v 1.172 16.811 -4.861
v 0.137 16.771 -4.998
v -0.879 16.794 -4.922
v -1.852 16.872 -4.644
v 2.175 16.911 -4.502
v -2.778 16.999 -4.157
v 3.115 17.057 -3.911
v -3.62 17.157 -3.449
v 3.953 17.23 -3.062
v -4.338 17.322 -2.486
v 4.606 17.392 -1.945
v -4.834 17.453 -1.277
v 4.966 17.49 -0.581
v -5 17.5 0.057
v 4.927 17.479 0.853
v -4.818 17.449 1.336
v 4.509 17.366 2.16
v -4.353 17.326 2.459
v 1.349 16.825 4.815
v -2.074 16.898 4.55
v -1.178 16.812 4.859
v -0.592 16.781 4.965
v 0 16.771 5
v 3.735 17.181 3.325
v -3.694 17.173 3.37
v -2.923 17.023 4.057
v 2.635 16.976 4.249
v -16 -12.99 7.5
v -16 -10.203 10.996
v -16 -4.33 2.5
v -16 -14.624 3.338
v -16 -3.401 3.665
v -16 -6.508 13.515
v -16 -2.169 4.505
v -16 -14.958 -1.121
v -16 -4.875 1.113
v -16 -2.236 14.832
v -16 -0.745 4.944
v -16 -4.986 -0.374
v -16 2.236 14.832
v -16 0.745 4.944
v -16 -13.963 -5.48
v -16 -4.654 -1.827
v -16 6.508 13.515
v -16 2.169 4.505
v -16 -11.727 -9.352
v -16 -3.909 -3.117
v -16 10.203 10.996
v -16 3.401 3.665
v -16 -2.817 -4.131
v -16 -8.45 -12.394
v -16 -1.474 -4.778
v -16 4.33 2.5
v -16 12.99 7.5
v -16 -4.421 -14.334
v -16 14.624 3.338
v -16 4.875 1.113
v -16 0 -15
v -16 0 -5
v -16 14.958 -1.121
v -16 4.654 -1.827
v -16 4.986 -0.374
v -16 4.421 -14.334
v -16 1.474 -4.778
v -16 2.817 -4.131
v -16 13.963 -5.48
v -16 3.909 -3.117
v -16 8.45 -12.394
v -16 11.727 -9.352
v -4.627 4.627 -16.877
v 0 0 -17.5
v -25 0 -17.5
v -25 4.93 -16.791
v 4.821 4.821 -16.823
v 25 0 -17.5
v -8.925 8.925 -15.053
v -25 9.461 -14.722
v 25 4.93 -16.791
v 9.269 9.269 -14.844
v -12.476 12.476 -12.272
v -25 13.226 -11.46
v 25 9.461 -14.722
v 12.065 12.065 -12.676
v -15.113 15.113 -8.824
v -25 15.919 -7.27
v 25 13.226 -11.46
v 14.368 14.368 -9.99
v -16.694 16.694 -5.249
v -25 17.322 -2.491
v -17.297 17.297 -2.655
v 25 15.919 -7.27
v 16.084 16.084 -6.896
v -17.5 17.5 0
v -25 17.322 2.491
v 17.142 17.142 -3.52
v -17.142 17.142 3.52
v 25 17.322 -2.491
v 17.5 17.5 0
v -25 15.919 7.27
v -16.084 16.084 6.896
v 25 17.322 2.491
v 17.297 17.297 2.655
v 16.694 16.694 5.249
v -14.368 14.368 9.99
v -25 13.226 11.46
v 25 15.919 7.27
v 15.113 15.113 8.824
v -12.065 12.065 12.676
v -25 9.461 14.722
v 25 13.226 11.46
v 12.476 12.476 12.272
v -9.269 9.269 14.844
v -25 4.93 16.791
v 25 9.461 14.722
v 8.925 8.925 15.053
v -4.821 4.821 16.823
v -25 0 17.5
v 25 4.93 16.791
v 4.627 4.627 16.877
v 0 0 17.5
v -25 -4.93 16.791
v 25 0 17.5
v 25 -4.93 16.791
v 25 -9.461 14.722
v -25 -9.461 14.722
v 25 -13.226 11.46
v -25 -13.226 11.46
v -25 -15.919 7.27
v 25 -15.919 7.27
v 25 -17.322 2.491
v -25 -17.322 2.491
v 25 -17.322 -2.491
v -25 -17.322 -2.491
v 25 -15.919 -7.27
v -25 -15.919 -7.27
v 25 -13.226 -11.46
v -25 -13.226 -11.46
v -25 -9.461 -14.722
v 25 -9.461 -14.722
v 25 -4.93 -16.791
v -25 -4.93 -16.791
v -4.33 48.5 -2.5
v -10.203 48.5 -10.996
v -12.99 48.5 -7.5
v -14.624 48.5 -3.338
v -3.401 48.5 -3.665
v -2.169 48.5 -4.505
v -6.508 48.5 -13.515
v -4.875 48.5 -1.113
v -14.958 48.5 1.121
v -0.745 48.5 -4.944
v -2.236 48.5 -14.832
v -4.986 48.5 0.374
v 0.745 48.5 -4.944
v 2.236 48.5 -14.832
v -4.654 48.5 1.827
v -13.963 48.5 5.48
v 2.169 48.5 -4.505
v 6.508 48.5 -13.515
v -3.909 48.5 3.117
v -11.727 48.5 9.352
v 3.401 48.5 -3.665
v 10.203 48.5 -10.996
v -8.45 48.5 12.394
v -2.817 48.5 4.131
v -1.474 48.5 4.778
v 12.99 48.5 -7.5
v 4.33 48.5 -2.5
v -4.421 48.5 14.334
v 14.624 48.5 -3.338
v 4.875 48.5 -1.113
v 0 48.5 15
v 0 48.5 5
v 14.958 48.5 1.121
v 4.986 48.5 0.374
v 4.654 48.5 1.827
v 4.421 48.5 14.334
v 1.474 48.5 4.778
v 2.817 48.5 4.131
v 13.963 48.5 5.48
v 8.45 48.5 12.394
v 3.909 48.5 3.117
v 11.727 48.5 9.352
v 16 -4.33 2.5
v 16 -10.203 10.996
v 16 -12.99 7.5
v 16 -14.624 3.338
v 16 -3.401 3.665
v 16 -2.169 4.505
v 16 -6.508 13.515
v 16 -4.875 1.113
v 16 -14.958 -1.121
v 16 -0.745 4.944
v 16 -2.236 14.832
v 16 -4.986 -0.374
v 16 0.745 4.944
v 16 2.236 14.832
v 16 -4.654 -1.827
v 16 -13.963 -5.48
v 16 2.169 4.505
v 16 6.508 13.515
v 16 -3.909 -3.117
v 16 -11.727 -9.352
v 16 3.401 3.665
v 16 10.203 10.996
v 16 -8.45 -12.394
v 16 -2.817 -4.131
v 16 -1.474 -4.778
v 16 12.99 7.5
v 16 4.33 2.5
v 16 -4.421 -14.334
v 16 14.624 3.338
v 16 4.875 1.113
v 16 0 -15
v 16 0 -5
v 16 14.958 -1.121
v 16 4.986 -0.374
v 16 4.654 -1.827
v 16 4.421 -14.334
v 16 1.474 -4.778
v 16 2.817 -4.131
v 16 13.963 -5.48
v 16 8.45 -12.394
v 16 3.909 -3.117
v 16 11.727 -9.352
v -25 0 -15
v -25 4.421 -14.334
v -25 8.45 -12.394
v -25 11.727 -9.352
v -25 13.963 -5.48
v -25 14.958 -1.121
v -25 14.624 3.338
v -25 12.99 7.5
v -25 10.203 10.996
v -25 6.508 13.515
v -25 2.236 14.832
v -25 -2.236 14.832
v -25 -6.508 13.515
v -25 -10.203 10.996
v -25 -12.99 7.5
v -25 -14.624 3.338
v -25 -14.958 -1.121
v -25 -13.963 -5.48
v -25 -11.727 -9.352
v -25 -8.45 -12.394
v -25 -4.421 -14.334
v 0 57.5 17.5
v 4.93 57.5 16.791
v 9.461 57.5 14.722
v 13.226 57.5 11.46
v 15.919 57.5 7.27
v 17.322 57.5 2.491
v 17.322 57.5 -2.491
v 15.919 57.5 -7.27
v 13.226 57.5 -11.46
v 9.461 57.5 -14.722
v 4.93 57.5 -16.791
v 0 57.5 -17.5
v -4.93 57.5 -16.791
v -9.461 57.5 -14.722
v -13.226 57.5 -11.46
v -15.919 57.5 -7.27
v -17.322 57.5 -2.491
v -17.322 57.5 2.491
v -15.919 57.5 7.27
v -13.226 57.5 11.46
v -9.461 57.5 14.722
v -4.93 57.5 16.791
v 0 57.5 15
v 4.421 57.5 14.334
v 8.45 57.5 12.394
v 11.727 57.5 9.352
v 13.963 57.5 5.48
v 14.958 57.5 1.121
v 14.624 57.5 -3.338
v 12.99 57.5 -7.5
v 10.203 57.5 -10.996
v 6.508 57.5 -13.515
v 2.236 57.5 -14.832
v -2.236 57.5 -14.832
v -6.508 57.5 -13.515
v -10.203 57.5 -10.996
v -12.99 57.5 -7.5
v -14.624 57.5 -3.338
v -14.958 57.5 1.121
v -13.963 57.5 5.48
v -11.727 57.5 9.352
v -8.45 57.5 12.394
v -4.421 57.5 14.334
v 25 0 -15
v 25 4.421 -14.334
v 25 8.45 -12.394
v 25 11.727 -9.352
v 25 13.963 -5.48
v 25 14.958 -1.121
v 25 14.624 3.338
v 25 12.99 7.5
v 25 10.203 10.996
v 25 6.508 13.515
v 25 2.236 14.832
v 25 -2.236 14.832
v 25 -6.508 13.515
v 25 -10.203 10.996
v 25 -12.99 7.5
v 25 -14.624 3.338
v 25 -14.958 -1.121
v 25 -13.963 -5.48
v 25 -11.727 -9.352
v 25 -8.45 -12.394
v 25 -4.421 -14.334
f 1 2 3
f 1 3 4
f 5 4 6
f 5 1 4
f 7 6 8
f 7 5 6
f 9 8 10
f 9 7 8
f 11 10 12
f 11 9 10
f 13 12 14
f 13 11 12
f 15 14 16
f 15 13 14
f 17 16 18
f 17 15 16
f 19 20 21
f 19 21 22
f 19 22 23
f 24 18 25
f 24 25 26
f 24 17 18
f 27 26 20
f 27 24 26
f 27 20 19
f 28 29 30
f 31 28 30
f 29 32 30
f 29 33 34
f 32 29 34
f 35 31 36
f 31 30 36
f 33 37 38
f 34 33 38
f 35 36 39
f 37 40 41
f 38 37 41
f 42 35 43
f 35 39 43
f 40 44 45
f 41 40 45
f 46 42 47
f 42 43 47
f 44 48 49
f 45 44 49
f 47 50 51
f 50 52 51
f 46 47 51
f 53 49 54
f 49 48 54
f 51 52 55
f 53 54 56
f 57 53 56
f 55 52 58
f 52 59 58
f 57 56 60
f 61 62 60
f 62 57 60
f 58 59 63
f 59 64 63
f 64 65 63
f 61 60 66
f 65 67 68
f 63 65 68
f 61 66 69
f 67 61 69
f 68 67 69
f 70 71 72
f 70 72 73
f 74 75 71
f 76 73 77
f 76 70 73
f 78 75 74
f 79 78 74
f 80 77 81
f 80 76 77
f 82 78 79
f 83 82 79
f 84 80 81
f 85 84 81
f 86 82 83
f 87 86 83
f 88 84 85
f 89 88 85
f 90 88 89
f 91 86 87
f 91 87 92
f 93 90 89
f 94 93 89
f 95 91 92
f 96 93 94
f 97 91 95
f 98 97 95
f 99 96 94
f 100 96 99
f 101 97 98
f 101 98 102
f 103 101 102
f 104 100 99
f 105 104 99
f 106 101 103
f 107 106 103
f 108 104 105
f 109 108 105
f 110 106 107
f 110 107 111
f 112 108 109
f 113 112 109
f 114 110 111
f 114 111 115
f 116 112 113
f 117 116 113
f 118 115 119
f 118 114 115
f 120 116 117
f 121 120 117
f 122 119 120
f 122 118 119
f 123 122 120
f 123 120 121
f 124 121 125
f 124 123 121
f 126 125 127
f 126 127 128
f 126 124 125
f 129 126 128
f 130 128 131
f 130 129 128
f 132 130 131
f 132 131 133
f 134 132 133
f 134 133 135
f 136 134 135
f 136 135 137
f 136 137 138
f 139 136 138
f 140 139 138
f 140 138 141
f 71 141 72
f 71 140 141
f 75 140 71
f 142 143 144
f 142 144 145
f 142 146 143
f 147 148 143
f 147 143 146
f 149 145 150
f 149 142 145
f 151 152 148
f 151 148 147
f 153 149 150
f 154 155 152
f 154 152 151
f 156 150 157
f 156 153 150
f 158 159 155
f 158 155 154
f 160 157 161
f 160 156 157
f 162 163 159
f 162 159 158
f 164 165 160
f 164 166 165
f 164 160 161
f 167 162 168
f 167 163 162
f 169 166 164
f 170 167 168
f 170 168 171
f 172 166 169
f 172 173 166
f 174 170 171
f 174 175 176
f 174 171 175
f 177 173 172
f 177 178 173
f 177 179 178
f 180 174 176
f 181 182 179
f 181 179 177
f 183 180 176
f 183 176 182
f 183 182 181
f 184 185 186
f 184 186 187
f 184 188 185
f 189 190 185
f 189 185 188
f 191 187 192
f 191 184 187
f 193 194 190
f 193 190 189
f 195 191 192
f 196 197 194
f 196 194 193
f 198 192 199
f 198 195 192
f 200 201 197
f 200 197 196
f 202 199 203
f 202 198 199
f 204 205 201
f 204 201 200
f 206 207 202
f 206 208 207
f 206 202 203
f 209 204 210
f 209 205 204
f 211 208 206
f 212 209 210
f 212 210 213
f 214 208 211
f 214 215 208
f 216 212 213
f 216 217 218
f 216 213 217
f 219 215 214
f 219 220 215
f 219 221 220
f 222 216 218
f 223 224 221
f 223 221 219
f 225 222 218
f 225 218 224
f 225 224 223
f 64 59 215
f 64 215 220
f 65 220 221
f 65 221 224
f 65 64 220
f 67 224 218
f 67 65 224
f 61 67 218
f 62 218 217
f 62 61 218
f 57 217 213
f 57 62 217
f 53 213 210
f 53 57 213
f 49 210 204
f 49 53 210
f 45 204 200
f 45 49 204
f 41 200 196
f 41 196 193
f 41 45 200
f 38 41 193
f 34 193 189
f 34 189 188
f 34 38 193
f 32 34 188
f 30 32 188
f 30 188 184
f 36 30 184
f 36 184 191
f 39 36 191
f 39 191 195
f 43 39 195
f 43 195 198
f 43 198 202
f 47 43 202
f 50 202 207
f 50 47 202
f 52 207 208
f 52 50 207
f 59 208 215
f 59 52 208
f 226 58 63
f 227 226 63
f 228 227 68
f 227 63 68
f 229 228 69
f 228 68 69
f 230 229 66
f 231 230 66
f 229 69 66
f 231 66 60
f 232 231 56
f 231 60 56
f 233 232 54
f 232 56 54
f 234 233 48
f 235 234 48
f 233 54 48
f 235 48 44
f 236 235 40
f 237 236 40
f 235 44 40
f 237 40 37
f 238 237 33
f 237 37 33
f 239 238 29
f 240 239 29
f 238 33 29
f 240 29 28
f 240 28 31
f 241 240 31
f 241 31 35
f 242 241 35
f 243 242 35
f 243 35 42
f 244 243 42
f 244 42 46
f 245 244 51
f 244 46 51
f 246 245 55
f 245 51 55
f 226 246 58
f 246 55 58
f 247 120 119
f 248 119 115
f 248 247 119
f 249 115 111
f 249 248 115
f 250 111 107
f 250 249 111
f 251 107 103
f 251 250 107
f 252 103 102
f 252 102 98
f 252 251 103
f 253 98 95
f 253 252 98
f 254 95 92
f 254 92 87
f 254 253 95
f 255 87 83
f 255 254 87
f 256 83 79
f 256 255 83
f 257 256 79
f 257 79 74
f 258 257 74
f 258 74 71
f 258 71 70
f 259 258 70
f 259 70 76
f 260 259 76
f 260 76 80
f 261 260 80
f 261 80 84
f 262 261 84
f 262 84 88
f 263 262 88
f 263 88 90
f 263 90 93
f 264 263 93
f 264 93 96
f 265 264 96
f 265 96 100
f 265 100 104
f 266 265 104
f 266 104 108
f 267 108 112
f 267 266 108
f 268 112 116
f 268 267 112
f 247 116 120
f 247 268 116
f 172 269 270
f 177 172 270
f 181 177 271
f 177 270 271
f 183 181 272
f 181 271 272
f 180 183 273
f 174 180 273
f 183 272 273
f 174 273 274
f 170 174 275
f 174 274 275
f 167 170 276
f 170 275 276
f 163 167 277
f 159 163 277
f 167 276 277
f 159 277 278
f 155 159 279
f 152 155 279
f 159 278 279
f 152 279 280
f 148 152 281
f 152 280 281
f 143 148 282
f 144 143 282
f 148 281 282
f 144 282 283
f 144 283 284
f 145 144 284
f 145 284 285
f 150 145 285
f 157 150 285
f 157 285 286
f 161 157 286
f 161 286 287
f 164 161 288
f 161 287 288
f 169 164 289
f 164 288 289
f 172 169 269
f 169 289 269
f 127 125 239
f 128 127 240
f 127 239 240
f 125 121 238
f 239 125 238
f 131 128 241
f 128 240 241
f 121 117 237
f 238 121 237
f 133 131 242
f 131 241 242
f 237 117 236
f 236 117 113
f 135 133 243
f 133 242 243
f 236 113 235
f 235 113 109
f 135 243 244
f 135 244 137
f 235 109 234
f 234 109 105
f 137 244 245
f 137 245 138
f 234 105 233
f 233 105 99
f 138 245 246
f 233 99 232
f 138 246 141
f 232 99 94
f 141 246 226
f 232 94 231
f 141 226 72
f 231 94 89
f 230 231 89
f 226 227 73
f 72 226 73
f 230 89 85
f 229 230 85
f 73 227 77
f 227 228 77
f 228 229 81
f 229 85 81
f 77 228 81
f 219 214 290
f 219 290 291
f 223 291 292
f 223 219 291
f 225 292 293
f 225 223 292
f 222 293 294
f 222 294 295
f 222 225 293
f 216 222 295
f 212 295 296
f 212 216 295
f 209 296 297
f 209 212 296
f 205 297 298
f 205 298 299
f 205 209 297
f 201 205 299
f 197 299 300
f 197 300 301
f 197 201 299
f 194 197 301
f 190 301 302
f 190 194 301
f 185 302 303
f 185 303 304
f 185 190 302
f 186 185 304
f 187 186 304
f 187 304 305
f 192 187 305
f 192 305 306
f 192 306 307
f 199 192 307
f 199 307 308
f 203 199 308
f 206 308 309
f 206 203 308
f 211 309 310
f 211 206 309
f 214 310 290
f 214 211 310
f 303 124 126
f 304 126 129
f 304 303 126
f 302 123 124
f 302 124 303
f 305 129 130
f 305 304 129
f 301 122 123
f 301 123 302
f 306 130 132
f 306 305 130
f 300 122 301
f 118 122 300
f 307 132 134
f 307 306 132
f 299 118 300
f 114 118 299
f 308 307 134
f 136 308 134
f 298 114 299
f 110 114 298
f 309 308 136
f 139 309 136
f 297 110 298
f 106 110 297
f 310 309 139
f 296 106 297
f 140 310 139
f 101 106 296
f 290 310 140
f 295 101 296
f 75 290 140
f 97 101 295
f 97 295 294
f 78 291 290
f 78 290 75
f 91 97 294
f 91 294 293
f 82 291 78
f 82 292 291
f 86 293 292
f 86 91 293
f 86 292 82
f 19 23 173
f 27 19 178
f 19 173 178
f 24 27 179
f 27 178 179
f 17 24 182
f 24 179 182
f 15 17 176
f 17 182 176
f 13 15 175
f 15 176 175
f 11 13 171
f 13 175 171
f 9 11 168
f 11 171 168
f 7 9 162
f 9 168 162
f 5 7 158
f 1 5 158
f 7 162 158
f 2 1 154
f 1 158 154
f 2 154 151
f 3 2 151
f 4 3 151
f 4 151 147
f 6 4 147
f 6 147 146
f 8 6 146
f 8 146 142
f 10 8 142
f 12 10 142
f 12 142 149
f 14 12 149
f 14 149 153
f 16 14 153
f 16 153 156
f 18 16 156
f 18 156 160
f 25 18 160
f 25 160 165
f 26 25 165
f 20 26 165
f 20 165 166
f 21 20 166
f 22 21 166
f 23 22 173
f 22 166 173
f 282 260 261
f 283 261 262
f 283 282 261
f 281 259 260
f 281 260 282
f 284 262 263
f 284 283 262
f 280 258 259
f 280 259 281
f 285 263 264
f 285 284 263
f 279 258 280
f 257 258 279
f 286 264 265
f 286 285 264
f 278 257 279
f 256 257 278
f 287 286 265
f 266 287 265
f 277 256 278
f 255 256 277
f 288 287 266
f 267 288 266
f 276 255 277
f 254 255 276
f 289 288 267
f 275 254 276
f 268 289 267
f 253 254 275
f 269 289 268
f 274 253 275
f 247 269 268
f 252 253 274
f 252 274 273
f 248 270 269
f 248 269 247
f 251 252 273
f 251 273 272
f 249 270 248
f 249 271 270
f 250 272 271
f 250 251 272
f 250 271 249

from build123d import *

# Parameters (mm, degrees)
SKETCH2_R                = 17.5
SKETCH2_R_2              = 5
BOSS_EXTRUDE1_DEPTH      = 25
CUT_EXTRUDE1_START       = -9
SKETCH3_R                = 15
SKETCH3_R_2              = 5
CUT_EXTRUDE1_DEPTH       = 9
BOSS_EXTRUDE2_REACH      = 82.971
BOSS_EXTRUDE2_END_RADIUS = 17.5
SKETCH5_R                = 17.5
SKETCH5_R_2              = 5
SKETCH6_R                = 15
SKETCH6_R_2              = 5
CUT_EXTRUDE2_DEPTH       = 9


with BuildPart() as part:
    # Sketch2 → Boss-Extrude1 (new, symmetric)
    with BuildSketch(Plane(origin=(0, 0, 0), x_dir=(0, 0, -1), z_dir=(1, 0, 0))):
        Circle(SKETCH2_R)
        Circle(SKETCH2_R_2, mode=Mode.SUBTRACT)
    extrude(amount=BOSS_EXTRUDE1_DEPTH, both=True)

    # Sketch3 → Cut-Extrude1 (cut)
    with BuildSketch(Plane(origin=(25, 0, 0), x_dir=(0, 0, -1), z_dir=(1, 0, 0)).offset(CUT_EXTRUDE1_START)):
        Circle(SKETCH3_R)
        Circle(SKETCH3_R_2, mode=Mode.SUBTRACT)
    cut_extrude1 = extrude(amount=CUT_EXTRUDE1_DEPTH, mode=Mode.SUBTRACT)

    # Mirror1: Cut-Extrude1 across plane
    add(cut_extrude1.mirror(Plane(origin=(0, 0, 0), x_dir=(0, 0, 1), z_dir=(1, 0, 0))), mode=Mode.SUBTRACT)

    # Boss-Extrude2: up to this cylinder (the profile starts outside it)
    boss_extrude2_end = Plane(origin=(0, 0, 0), z_dir=(-1, 0, 0)) * Cylinder(BOSS_EXTRUDE2_END_RADIUS, 201.942, mode=Mode.PRIVATE)
    # Sketch5 → Boss-Extrude2 (add, up to the surface)
    with BuildSketch(Plane(origin=(0, 57.5, 0), x_dir=(1, 0, 0), z_dir=(0, 1, 0)), mode=Mode.PRIVATE) as boss_extrude2_sk1:
        with Locations(Location((0, 0, 0), (0, 0, 270))):
            Circle(SKETCH5_R)
        with Locations(Location((0, 0, 0), (0, 0, 270))):
            Circle(SKETCH5_R_2, mode=Mode.SUBTRACT)
    boss_extrude2_tool1 = extrude(boss_extrude2_sk1.sketch, amount=-BOSS_EXTRUDE2_REACH, mode=Mode.PRIVATE) - boss_extrude2_end
    add(boss_extrude2_tool1.solids().sort_by_distance((0, 57.5, -17.005025))[0])

    # Sketch6 → Cut-Extrude2 (cut)
    with BuildSketch(Plane(origin=(0, 57.5, 0), x_dir=(1, 0, 0), z_dir=(0, 1, 0))):
        with Locations(Location((0, 0, 0), (0, 0, 270))):
            Circle(SKETCH6_R)
        with Locations(Location((0, 0, 0), (0, 0, 270))):
            Circle(SKETCH6_R_2, mode=Mode.SUBTRACT)
    extrude(amount=-CUT_EXTRUDE2_DEPTH, mode=Mode.SUBTRACT)


solid = part.part
